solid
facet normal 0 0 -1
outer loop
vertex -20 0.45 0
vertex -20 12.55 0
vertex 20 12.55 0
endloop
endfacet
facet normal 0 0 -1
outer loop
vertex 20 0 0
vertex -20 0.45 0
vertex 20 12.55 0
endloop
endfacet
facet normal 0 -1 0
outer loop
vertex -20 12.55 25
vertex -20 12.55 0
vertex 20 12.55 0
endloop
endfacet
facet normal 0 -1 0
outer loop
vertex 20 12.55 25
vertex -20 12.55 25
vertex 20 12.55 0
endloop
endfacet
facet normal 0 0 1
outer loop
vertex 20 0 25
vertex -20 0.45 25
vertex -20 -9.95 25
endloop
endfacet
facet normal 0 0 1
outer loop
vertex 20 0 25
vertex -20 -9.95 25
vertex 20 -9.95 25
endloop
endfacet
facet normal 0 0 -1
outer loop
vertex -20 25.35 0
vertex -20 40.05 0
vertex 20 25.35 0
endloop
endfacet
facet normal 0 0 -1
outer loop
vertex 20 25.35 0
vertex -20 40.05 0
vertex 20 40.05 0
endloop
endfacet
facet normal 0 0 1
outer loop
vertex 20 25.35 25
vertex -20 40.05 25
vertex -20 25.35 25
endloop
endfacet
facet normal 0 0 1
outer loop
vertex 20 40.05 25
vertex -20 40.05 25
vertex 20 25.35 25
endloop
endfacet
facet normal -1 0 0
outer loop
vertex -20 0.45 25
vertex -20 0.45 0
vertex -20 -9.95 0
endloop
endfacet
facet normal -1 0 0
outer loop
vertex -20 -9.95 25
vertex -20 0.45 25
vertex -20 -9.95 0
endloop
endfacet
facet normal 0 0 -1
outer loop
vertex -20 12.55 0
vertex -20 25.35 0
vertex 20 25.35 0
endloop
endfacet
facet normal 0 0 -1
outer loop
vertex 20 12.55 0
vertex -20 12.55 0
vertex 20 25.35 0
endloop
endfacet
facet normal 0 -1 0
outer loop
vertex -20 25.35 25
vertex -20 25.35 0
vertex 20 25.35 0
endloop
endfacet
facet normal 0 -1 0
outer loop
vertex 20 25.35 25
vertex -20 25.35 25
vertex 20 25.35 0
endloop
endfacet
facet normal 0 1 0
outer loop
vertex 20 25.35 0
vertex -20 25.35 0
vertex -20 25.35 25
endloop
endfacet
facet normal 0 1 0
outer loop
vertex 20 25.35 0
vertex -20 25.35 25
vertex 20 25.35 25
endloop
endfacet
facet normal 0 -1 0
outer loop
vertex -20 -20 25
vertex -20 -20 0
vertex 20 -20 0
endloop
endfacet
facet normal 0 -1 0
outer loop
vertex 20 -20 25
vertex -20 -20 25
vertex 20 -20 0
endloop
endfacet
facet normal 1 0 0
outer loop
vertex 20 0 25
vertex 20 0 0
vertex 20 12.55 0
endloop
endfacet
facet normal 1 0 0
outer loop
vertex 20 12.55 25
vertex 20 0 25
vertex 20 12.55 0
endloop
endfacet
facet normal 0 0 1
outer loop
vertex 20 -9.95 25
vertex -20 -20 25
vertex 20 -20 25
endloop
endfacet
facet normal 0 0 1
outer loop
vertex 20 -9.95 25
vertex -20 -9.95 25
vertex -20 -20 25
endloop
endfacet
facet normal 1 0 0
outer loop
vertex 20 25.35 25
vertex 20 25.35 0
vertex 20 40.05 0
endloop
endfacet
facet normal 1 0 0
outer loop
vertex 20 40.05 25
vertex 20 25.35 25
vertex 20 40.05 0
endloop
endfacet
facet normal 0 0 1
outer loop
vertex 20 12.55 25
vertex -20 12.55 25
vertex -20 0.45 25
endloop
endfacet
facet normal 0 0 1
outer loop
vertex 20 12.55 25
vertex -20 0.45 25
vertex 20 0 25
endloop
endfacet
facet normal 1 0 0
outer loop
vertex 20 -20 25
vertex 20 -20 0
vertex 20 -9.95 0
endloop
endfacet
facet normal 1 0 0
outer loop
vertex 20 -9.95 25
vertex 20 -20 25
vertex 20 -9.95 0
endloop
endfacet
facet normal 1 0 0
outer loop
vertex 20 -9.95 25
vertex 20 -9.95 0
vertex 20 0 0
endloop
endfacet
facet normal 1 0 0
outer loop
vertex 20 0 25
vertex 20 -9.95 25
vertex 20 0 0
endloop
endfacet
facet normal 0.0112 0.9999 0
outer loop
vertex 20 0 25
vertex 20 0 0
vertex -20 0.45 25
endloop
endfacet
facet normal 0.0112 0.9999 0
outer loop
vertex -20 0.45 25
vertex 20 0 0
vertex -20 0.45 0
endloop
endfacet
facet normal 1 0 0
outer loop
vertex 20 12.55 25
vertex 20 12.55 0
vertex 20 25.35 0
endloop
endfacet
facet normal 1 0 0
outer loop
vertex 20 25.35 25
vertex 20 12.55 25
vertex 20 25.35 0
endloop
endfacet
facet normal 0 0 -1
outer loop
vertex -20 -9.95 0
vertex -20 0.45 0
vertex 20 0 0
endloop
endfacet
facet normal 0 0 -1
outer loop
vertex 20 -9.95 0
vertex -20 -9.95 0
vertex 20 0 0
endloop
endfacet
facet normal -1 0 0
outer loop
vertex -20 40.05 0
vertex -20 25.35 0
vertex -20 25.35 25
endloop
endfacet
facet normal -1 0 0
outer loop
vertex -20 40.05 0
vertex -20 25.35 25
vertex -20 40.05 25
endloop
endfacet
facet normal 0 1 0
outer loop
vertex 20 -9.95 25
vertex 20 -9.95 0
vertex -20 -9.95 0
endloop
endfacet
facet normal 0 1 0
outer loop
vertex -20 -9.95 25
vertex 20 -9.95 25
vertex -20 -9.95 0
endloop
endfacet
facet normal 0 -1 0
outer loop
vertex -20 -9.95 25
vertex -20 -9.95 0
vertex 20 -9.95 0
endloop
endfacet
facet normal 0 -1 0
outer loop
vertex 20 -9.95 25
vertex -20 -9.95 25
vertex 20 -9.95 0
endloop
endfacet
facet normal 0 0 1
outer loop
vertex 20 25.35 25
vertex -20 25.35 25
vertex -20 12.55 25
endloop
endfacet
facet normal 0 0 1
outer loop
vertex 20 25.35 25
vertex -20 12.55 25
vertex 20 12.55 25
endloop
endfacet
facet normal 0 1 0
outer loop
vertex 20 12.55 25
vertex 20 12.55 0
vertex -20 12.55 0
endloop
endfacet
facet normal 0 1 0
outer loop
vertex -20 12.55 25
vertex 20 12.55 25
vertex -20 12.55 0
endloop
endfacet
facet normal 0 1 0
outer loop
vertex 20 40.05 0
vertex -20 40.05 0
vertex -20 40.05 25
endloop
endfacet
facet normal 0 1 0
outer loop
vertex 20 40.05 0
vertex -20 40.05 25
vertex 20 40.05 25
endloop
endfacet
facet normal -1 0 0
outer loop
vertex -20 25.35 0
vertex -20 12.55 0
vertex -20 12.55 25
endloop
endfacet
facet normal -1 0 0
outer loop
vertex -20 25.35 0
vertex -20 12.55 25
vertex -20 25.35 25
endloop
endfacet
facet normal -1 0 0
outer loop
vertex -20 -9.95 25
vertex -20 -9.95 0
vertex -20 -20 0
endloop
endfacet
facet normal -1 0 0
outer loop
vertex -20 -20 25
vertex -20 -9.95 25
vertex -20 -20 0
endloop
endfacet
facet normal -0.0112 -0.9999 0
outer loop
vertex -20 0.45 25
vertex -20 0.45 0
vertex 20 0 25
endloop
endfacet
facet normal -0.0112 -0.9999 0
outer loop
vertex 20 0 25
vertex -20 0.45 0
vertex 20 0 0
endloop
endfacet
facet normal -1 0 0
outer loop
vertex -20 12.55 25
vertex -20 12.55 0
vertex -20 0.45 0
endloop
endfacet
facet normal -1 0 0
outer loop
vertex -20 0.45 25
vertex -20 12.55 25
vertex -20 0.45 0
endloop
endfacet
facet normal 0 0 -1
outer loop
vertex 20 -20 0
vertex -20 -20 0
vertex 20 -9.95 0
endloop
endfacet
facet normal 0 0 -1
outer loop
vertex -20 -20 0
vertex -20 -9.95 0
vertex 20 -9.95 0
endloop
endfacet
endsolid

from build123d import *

# Parameters (mm, degrees)
F0_W     = 40
F0_H     = 14.7
F1_DEPTH = 25
F0_H_2   = 12.8
F2_DEPTH = 25
F3_DEPTH = 25
F4_DEPTH = 25
F5_DEPTH = 25


with BuildPart() as f1:
    # F0 (on Top) → F1 (new body)
    with BuildSketch(Plane.XY):
        with Locations((0, 32.7)):
            Rectangle(F0_W, F0_H)
    extrude(amount=F1_DEPTH)


with BuildPart() as f2:
    # F0 (on Top) → F2 (new body)
    with BuildSketch(Plane.XY):
        with Locations((0, 18.95)):
            Rectangle(F0_W, F0_H_2)
    extrude(amount=F2_DEPTH)


with BuildPart() as f3:
    # F0 (on Top) → F3 (new body)
    with BuildSketch(Plane.XY):
        Polygon((-20, 12.55), (-20, 0.45), (20, 0), (20, 12.55), align=None)
    extrude(amount=F3_DEPTH)


with BuildPart() as f4:
    # F0 (on Top) → F4 (new body)
    with BuildSketch(Plane.XY):
        Polygon((-20, 0.45), (-20, -9.95), (20, -9.95), (20, 0), align=None)
    extrude(amount=F4_DEPTH)


with BuildPart() as f5:
    # F0 (on Top) → F5 (new body)
    with BuildSketch(Plane.XY):
        Polygon((-20, -20), (0, -20), (20, -20), (20, -9.95), (-20, -9.95), align=None)
    extrude(amount=F5_DEPTH)


solid = Compound([f1.part, f2.part, f3.part, f4.part, f5.part])
